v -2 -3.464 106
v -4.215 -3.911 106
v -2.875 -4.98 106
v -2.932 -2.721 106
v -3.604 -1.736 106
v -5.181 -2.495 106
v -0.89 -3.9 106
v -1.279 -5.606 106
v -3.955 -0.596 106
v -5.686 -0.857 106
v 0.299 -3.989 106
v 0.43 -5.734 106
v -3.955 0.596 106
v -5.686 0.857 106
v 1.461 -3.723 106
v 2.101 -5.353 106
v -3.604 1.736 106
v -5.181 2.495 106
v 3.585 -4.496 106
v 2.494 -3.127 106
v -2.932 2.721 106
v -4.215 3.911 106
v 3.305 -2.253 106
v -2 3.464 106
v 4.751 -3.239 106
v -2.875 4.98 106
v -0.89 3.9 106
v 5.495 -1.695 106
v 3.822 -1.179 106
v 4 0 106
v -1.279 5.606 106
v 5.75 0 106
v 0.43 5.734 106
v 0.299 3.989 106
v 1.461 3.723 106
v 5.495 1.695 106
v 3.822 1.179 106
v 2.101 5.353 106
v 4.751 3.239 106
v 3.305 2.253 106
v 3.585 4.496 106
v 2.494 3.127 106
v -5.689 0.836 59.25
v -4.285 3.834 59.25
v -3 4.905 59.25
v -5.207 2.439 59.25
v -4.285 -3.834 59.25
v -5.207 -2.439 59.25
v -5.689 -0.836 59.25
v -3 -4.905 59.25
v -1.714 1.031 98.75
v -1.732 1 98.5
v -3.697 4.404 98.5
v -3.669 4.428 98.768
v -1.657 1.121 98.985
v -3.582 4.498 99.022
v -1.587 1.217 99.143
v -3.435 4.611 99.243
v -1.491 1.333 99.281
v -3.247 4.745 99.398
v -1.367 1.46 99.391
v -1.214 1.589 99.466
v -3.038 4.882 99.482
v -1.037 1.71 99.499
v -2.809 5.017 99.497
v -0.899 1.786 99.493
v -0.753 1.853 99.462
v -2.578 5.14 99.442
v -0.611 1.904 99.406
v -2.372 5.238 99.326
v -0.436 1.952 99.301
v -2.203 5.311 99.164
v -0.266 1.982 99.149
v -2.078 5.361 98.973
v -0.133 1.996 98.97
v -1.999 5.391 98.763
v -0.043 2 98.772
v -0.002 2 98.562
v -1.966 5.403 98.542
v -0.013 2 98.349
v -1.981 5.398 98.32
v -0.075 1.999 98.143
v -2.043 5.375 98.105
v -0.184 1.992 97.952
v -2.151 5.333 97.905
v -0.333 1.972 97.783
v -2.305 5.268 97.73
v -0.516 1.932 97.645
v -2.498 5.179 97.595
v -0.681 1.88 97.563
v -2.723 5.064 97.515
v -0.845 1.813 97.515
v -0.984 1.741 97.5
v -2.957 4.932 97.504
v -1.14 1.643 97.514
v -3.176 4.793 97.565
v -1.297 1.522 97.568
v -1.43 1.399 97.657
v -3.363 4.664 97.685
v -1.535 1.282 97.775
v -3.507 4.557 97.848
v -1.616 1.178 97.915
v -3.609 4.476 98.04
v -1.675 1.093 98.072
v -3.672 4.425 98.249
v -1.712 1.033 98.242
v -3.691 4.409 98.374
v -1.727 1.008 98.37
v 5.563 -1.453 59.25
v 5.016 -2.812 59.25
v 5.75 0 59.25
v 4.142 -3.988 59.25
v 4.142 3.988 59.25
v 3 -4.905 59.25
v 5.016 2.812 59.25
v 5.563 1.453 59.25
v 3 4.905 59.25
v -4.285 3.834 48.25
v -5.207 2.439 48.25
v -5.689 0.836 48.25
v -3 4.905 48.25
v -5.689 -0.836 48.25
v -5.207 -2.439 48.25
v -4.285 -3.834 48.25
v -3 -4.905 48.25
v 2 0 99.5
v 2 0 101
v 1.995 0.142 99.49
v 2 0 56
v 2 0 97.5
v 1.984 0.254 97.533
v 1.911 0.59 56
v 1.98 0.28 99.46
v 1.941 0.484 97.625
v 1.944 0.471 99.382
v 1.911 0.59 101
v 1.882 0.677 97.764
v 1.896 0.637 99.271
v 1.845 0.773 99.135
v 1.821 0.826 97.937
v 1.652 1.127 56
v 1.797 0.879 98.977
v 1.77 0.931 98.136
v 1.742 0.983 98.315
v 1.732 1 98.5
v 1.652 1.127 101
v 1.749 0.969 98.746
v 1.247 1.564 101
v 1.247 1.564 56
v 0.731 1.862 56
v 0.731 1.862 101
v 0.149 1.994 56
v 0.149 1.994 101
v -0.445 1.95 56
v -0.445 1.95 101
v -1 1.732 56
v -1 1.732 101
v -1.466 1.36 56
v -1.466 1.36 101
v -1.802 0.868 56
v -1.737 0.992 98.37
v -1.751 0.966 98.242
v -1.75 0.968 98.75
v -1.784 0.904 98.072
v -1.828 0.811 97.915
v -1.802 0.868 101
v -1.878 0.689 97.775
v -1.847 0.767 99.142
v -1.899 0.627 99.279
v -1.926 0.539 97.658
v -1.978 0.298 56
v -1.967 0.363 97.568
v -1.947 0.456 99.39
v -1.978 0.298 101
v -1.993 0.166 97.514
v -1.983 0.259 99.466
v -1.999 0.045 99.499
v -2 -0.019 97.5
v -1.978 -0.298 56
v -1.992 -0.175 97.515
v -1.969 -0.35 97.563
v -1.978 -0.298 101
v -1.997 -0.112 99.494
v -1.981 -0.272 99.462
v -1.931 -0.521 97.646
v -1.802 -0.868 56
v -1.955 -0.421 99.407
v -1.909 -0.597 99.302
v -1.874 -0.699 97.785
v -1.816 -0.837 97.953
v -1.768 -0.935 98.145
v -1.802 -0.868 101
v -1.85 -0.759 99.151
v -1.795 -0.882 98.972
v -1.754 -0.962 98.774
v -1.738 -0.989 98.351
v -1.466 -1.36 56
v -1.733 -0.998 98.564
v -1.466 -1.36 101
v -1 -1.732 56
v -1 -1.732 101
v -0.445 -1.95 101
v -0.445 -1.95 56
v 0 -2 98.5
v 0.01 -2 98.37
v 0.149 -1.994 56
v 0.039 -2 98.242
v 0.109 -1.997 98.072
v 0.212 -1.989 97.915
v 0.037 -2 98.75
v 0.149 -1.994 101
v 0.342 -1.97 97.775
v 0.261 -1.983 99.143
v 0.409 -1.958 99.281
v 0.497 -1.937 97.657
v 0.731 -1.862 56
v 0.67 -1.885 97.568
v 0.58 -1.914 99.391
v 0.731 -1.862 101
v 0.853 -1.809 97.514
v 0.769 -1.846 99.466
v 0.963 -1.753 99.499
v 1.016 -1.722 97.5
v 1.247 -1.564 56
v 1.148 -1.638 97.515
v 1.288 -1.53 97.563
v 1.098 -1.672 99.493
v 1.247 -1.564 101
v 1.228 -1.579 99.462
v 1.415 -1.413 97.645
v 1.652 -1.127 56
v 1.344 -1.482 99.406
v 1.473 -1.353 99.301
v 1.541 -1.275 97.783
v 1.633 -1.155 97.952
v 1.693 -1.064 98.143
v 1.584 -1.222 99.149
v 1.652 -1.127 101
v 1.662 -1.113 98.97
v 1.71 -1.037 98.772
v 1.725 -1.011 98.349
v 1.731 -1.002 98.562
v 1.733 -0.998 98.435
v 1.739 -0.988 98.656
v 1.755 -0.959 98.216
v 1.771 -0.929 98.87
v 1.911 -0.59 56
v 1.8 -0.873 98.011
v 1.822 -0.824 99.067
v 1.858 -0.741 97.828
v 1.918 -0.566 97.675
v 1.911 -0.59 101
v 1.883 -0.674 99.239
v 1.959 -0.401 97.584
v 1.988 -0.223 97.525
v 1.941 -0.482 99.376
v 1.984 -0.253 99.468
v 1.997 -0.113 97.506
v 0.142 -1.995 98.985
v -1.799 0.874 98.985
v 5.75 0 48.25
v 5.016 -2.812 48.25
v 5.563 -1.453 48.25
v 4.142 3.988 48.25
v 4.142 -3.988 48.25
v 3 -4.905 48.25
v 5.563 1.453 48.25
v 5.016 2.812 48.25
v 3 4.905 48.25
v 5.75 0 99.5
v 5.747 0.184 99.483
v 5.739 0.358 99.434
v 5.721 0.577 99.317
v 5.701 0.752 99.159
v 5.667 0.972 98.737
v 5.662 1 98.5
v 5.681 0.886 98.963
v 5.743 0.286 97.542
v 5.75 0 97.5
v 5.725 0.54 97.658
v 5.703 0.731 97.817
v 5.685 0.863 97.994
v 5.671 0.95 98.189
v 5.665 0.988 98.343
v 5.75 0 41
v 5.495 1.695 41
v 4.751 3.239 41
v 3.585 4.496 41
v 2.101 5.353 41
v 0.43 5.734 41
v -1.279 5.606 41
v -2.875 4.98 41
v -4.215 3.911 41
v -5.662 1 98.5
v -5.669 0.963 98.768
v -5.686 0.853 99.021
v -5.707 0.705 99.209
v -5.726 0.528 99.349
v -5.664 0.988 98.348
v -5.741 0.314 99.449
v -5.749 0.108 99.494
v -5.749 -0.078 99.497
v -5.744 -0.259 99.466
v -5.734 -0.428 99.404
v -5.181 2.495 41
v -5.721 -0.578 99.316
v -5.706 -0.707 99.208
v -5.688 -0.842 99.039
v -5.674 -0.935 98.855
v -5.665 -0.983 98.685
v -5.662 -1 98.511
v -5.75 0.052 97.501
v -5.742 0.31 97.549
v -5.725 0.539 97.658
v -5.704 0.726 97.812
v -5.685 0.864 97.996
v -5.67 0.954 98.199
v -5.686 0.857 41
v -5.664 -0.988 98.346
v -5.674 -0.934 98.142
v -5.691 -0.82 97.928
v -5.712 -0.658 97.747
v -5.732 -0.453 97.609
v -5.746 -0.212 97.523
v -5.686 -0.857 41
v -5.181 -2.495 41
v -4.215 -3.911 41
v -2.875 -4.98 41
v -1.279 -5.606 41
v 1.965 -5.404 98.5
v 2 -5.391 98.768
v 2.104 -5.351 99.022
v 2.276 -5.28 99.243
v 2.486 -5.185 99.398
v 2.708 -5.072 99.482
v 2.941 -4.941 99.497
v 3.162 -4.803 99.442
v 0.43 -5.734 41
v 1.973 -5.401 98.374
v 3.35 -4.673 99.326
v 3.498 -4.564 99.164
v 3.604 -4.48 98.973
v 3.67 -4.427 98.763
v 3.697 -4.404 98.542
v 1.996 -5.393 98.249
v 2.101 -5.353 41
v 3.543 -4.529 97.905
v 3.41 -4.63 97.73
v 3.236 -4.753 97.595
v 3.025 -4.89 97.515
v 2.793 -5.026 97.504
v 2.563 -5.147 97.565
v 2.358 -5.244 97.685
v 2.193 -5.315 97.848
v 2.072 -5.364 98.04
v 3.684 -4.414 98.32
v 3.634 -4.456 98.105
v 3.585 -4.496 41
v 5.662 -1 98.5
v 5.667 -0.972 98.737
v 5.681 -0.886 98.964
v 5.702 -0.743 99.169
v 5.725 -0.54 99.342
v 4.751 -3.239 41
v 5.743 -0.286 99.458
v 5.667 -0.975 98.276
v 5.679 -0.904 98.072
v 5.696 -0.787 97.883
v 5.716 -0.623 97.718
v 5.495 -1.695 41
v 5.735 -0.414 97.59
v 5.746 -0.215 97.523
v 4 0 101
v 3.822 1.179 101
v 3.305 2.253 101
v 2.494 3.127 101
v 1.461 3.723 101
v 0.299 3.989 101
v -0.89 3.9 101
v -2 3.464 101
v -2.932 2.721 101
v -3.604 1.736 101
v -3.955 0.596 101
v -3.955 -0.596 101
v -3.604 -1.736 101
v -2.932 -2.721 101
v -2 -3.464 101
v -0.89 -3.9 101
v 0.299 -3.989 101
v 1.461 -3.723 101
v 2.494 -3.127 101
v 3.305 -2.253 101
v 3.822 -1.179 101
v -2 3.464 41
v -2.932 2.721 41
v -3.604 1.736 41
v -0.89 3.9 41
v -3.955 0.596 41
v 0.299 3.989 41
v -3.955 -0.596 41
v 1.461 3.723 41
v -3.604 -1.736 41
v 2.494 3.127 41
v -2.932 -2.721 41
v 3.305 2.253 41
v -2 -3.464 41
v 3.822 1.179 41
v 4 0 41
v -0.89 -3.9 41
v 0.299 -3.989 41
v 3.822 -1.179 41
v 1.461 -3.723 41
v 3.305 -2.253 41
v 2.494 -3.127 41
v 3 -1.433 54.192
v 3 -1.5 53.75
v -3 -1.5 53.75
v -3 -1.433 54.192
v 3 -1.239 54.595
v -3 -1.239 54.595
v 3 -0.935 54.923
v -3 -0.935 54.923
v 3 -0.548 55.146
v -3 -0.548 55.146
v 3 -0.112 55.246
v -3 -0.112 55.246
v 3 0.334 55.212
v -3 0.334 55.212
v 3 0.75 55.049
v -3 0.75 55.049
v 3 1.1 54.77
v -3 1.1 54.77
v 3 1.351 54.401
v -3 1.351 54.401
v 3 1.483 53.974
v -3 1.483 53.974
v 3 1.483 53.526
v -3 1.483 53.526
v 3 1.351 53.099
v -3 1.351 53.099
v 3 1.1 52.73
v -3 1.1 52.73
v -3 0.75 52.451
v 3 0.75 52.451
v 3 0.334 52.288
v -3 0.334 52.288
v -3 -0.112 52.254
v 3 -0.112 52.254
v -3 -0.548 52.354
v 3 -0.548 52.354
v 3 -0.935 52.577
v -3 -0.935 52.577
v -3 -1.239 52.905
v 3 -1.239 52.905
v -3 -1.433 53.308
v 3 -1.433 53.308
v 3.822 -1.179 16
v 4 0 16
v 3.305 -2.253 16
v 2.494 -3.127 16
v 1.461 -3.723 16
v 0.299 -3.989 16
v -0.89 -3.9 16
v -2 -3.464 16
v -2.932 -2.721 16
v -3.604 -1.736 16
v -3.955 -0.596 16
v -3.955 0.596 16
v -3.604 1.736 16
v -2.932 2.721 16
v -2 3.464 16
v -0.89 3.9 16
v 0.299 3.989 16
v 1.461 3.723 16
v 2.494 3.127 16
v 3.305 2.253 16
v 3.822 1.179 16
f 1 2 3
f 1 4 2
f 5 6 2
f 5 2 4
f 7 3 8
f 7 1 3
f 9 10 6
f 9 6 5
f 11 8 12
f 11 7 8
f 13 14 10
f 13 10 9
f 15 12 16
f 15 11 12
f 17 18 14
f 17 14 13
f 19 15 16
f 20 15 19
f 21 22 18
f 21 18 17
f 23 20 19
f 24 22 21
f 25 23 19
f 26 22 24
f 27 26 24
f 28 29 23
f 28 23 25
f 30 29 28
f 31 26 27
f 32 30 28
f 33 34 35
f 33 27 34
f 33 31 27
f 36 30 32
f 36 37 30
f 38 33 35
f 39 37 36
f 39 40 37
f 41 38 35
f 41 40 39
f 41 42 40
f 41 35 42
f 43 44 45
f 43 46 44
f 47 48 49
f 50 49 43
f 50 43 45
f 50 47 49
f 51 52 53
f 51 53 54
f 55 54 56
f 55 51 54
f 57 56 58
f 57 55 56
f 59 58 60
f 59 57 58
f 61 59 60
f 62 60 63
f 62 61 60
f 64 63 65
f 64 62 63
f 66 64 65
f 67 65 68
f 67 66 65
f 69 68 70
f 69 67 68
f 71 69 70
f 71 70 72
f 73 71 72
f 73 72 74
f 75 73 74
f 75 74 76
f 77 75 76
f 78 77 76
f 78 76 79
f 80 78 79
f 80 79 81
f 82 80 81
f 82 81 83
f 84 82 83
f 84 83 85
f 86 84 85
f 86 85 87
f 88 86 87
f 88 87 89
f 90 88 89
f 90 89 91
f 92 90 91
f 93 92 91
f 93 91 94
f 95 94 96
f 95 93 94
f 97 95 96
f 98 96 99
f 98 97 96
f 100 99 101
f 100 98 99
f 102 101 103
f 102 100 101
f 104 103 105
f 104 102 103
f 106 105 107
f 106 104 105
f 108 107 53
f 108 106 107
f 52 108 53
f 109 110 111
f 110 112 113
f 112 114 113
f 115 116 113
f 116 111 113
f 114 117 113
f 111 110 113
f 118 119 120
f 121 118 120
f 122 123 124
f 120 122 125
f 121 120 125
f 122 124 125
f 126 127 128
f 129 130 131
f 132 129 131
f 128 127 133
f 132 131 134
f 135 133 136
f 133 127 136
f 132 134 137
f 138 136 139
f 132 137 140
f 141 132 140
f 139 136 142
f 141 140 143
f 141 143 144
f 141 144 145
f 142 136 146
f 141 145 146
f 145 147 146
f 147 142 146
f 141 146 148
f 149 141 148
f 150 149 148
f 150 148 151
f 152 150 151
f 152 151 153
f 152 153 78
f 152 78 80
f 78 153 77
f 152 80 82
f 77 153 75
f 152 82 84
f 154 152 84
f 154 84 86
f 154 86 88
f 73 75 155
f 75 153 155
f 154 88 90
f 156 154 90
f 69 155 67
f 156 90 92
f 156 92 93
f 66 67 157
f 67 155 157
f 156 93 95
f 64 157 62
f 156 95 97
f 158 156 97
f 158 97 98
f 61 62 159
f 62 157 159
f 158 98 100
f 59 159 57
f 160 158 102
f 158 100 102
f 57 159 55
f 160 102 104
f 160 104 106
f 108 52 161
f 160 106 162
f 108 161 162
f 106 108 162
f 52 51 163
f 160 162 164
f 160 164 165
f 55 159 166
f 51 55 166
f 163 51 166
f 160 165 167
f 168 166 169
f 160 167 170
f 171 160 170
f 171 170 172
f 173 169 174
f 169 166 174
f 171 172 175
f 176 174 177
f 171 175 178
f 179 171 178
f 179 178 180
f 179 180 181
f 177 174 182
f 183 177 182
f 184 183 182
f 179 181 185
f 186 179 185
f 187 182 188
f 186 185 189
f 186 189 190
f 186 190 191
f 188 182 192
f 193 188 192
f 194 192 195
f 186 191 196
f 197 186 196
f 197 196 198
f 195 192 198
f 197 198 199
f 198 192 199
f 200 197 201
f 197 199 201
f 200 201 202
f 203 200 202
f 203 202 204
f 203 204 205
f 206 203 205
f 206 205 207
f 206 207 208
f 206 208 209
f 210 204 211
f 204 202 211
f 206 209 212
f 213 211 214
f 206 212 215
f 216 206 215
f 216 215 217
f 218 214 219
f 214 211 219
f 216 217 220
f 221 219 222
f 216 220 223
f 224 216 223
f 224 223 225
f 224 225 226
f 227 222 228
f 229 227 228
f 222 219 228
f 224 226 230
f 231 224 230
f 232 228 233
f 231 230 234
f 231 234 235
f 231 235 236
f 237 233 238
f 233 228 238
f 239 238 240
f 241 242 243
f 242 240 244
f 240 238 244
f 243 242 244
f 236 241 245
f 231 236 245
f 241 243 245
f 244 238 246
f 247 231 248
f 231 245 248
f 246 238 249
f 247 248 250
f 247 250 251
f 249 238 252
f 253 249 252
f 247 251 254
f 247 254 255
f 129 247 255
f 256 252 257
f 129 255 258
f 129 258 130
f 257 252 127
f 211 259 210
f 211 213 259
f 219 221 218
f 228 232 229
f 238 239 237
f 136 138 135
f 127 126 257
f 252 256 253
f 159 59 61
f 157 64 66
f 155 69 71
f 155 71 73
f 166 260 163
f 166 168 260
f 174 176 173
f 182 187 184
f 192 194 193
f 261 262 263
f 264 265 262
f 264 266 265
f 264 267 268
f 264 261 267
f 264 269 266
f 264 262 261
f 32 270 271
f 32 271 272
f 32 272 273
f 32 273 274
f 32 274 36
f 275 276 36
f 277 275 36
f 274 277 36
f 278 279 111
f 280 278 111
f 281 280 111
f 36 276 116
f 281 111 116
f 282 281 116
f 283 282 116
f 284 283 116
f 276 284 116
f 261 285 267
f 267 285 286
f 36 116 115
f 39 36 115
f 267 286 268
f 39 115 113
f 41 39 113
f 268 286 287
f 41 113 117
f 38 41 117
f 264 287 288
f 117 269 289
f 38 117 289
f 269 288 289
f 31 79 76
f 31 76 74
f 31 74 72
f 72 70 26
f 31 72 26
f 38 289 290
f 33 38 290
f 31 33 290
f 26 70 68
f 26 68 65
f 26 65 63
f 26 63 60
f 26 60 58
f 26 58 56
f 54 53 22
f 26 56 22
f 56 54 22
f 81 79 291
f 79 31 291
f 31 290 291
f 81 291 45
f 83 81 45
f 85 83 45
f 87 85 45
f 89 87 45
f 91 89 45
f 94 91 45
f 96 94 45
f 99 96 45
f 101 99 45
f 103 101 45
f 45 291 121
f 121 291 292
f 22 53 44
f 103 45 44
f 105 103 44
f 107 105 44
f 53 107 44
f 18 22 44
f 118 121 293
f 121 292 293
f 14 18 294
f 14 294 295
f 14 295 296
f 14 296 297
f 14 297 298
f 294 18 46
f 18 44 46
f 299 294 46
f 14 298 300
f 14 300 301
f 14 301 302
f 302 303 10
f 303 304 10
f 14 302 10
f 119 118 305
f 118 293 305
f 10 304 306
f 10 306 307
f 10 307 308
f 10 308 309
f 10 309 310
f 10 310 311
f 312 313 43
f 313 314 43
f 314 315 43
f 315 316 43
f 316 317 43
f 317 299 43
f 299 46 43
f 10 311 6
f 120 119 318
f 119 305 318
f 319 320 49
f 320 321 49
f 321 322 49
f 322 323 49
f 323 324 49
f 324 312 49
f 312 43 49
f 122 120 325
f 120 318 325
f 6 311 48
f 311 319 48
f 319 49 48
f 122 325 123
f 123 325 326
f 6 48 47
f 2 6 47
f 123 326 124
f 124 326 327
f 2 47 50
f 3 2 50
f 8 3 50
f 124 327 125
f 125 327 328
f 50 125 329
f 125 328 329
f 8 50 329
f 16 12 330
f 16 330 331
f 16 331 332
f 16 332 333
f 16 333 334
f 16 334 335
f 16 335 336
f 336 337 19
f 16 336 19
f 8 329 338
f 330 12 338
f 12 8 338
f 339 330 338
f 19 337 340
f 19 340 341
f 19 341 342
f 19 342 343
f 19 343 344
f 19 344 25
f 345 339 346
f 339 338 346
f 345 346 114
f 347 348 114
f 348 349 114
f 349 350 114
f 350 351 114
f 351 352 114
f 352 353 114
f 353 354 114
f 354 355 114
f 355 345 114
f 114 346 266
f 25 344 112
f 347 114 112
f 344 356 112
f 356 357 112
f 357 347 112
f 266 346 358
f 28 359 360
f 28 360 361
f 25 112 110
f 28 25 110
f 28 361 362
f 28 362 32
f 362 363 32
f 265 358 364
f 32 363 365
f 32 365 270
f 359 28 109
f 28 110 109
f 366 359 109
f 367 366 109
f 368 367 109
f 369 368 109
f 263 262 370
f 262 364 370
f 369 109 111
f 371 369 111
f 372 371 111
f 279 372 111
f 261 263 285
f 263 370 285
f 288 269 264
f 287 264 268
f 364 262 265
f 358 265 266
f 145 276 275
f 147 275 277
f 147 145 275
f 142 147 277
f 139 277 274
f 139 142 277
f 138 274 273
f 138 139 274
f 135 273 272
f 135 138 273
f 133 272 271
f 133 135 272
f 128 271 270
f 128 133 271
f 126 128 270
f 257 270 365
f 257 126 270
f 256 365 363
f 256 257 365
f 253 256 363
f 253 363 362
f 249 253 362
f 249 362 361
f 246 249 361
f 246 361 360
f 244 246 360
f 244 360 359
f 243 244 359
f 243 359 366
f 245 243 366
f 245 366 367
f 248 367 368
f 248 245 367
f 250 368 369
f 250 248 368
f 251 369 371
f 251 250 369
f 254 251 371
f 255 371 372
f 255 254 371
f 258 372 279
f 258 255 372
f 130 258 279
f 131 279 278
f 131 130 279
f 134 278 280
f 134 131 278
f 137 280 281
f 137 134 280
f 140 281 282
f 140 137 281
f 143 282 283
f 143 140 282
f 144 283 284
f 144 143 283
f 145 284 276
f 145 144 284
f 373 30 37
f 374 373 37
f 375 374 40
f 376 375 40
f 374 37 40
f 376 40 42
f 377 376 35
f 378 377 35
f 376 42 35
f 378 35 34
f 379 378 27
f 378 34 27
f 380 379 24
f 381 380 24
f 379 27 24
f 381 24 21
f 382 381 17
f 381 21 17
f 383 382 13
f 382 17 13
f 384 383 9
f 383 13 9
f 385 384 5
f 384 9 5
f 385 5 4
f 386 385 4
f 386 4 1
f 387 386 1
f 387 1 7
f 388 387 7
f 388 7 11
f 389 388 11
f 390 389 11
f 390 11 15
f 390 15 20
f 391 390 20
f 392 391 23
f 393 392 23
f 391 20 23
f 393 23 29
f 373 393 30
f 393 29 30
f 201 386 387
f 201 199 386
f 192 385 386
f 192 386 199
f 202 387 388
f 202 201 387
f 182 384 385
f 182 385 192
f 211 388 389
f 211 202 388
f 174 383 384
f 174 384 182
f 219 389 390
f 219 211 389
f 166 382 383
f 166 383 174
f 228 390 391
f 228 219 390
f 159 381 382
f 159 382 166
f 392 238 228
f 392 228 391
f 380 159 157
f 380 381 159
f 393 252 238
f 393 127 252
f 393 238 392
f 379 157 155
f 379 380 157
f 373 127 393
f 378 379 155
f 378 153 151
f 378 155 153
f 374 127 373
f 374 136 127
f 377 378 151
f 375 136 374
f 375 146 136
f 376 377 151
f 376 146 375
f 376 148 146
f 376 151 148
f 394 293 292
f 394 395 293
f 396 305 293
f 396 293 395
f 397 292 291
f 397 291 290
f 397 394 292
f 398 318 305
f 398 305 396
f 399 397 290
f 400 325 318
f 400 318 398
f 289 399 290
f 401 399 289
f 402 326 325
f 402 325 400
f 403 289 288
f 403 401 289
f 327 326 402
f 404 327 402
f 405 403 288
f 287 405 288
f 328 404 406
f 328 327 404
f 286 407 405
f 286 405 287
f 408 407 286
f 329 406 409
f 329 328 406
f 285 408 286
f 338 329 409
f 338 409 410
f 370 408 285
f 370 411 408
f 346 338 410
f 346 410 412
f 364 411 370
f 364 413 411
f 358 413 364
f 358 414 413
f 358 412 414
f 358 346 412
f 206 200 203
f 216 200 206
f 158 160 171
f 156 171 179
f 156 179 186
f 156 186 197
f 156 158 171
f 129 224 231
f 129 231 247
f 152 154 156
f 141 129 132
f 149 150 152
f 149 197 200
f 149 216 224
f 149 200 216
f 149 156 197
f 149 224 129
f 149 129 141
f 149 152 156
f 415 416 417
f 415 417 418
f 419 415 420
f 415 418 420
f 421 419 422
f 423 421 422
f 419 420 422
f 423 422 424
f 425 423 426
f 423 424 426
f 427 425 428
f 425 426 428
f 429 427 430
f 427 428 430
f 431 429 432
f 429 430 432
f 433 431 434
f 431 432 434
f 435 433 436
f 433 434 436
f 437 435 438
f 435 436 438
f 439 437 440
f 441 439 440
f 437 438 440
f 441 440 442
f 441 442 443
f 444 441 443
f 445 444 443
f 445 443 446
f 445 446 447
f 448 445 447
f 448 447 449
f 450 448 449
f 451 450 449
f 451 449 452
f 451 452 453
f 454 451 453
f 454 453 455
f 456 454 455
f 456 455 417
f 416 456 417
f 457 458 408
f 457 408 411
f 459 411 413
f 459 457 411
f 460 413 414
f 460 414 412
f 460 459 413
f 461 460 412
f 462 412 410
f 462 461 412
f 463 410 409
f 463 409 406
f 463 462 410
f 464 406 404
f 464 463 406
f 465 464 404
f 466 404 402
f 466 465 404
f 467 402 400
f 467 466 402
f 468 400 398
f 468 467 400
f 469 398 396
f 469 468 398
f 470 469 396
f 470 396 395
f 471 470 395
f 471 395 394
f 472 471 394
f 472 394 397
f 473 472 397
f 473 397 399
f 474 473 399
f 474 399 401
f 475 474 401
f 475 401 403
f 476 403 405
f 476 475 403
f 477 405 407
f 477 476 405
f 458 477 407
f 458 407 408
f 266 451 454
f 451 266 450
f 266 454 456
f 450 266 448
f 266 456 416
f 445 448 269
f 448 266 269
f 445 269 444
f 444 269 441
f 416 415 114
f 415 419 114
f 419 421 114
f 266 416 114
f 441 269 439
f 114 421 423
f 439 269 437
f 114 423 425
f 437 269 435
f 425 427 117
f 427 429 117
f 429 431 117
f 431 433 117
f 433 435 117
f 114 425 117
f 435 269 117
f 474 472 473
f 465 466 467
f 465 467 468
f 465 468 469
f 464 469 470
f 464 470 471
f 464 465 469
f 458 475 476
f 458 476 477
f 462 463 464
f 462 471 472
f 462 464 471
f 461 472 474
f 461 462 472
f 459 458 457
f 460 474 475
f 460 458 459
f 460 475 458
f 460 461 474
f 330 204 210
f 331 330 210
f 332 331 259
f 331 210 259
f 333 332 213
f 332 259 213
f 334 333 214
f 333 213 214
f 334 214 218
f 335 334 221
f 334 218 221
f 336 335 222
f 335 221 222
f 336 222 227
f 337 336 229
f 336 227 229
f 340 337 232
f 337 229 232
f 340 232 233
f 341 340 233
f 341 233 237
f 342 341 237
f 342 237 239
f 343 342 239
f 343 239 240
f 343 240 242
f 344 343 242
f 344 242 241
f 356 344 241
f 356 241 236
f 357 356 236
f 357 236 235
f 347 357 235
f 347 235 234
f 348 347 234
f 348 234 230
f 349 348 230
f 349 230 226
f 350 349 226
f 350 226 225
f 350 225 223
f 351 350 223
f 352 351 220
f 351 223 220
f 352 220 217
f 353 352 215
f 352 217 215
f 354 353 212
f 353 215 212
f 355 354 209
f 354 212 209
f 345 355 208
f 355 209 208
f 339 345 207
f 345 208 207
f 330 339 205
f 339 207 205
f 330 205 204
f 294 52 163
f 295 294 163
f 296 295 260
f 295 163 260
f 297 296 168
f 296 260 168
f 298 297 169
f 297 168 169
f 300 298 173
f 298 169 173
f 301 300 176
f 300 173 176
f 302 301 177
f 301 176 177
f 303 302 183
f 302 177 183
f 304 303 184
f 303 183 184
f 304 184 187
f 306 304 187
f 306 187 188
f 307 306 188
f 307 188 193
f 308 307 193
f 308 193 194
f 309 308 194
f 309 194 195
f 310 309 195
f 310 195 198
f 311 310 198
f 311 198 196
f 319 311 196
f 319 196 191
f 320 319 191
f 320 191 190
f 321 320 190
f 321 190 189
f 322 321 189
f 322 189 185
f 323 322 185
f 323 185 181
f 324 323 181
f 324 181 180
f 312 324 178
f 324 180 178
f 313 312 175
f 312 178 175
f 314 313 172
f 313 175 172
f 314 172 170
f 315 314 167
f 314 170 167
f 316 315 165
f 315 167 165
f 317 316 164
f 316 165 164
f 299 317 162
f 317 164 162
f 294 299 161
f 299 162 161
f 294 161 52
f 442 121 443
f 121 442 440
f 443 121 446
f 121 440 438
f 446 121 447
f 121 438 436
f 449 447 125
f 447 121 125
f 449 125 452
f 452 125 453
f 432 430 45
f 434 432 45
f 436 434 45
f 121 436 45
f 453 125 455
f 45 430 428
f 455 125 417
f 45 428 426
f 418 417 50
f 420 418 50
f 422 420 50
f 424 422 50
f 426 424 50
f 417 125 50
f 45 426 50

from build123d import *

# Parameters (mm, degrees)
SKETCH_R             = 5.75
PAD_DEPTH            = 106
SKETCH001_R          = 1
POCKET_DEPTH         = 20
POCKET_DEPTH_BACK    = -20
PAD001_DEPTH         = 1
SKETCH003_R          = 1
POCKET001_DEPTH      = 20
POCKET001_DEPTH_BACK = -20
SKETCH005_R          = 4
POCKET003_DEPTH      = 5
POCKET003_DEPTH_BACK = 5
SKETCH006_R          = 2
POCKET004_DEPTH      = 50
SKETCH007_W          = 47.595639
SKETCH007_H          = 11
SKETCH007_W_2        = 12.114317
POCKET005_DEPTH      = 20
POCKET005_DEPTH_BACK = -20
SKETCH008_R          = 1.5
POCKET006_DEPTH      = 8.751
SKETCH009_R          = 12.128258
POCKET007_DEPTH      = 16
SKETCH010_R          = 8.873547
SKETCH010_R_2        = 4
POCKET008_DEPTH      = 25


with BuildPart() as part:
    # Sketch → Pad (new body)
    with BuildSketch(Plane.XY):
        Circle(SKETCH_R)
    extrude(amount=PAD_DEPTH)

    # Sketch001 → Pocket (cut, two sides)
    with BuildSketch(Plane.YZ) as pocket_sk:
        with Locations((0, 98.5)):
            Circle(SKETCH001_R)
    extrude(amount=-POCKET_DEPTH, mode=Mode.SUBTRACT)
    extrude(pocket_sk.sketch, amount=-POCKET_DEPTH_BACK, mode=Mode.SUBTRACT)

    # Sketch002 (on Face4 of Pocket) → Pad001 (join)
    with BuildSketch(Plane.XY.offset(106)):
        Polygon((0, 0), (1, 0.57735), (1, 0), align=None)
    extrude(amount=PAD001_DEPTH)

    # Sketch003 (on Face7 of Pad001) → Pocket001 (cut, two sides)
    with BuildSketch(Plane(origin=(0, 0, 0), x_dir=(-0.866026, -0.5, 0), z_dir=(-0.5, 0.866026, 0))) as pocket001_sk:
        with Locations((0, 98.5)):
            Circle(SKETCH003_R)
    extrude(amount=-POCKET001_DEPTH, mode=Mode.SUBTRACT)
    extrude(pocket001_sk.sketch, amount=-POCKET001_DEPTH_BACK, mode=Mode.SUBTRACT)

    # Sketch005 → Pocket003 (cut, two sides)
    with BuildSketch(Plane.XY.offset(106)) as pocket003_sk:
        Circle(SKETCH005_R)
    extrude(amount=POCKET003_DEPTH, mode=Mode.SUBTRACT)
    extrude(pocket003_sk.sketch, amount=-POCKET003_DEPTH_BACK, mode=Mode.SUBTRACT)

    # Sketch006 (on Face3 of Pocket003) → Pocket004 (cut)
    with BuildSketch(Plane.XY.offset(106)):
        Circle(SKETCH006_R)
    extrude(amount=-POCKET004_DEPTH, mode=Mode.SUBTRACT)

    # Sketch007 → Pocket005 (cut, two sides)
    with BuildSketch(Plane.XZ) as pocket005_sk:
        with Locations((-26.797819, 53.75)):
            Rectangle(SKETCH007_W, SKETCH007_H)
        with Locations((9.057158, 53.75)):
            Rectangle(SKETCH007_W_2, SKETCH007_H)
    extrude(amount=-POCKET005_DEPTH, mode=Mode.SUBTRACT)
    extrude(pocket005_sk.sketch, amount=-POCKET005_DEPTH_BACK, mode=Mode.SUBTRACT)

    # Sketch008 (on Face11 of Pocket005) → Pocket006 (cut, through all)
    with BuildSketch(Plane(origin=(-3, 0, 0), x_dir=(0, -1, 0), z_dir=(-1, 0, 0))):
        with Locations((0, 53.75)):
            Circle(SKETCH008_R)
    extrude(amount=-POCKET006_DEPTH, mode=Mode.SUBTRACT)

    # Sketch009 (on Face2 of Pocket006) → Pocket007 (cut)
    with BuildSketch(Plane(origin=(0, 0, 0), x_dir=(1, 0, 0), z_dir=(0, 0, -1))):
        Circle(SKETCH009_R)
    extrude(amount=-POCKET007_DEPTH, mode=Mode.SUBTRACT)

    # Sketch010 (on Face2 of Pocket007) → Pocket008 (cut)
    with BuildSketch(Plane(origin=(0, 0, 16), x_dir=(1, 0, 0), z_dir=(0, 0, -1))):
        Circle(SKETCH010_R)
        Circle(SKETCH010_R_2, mode=Mode.SUBTRACT)
    extrude(amount=-POCKET008_DEPTH, mode=Mode.SUBTRACT)


solid = part.part
